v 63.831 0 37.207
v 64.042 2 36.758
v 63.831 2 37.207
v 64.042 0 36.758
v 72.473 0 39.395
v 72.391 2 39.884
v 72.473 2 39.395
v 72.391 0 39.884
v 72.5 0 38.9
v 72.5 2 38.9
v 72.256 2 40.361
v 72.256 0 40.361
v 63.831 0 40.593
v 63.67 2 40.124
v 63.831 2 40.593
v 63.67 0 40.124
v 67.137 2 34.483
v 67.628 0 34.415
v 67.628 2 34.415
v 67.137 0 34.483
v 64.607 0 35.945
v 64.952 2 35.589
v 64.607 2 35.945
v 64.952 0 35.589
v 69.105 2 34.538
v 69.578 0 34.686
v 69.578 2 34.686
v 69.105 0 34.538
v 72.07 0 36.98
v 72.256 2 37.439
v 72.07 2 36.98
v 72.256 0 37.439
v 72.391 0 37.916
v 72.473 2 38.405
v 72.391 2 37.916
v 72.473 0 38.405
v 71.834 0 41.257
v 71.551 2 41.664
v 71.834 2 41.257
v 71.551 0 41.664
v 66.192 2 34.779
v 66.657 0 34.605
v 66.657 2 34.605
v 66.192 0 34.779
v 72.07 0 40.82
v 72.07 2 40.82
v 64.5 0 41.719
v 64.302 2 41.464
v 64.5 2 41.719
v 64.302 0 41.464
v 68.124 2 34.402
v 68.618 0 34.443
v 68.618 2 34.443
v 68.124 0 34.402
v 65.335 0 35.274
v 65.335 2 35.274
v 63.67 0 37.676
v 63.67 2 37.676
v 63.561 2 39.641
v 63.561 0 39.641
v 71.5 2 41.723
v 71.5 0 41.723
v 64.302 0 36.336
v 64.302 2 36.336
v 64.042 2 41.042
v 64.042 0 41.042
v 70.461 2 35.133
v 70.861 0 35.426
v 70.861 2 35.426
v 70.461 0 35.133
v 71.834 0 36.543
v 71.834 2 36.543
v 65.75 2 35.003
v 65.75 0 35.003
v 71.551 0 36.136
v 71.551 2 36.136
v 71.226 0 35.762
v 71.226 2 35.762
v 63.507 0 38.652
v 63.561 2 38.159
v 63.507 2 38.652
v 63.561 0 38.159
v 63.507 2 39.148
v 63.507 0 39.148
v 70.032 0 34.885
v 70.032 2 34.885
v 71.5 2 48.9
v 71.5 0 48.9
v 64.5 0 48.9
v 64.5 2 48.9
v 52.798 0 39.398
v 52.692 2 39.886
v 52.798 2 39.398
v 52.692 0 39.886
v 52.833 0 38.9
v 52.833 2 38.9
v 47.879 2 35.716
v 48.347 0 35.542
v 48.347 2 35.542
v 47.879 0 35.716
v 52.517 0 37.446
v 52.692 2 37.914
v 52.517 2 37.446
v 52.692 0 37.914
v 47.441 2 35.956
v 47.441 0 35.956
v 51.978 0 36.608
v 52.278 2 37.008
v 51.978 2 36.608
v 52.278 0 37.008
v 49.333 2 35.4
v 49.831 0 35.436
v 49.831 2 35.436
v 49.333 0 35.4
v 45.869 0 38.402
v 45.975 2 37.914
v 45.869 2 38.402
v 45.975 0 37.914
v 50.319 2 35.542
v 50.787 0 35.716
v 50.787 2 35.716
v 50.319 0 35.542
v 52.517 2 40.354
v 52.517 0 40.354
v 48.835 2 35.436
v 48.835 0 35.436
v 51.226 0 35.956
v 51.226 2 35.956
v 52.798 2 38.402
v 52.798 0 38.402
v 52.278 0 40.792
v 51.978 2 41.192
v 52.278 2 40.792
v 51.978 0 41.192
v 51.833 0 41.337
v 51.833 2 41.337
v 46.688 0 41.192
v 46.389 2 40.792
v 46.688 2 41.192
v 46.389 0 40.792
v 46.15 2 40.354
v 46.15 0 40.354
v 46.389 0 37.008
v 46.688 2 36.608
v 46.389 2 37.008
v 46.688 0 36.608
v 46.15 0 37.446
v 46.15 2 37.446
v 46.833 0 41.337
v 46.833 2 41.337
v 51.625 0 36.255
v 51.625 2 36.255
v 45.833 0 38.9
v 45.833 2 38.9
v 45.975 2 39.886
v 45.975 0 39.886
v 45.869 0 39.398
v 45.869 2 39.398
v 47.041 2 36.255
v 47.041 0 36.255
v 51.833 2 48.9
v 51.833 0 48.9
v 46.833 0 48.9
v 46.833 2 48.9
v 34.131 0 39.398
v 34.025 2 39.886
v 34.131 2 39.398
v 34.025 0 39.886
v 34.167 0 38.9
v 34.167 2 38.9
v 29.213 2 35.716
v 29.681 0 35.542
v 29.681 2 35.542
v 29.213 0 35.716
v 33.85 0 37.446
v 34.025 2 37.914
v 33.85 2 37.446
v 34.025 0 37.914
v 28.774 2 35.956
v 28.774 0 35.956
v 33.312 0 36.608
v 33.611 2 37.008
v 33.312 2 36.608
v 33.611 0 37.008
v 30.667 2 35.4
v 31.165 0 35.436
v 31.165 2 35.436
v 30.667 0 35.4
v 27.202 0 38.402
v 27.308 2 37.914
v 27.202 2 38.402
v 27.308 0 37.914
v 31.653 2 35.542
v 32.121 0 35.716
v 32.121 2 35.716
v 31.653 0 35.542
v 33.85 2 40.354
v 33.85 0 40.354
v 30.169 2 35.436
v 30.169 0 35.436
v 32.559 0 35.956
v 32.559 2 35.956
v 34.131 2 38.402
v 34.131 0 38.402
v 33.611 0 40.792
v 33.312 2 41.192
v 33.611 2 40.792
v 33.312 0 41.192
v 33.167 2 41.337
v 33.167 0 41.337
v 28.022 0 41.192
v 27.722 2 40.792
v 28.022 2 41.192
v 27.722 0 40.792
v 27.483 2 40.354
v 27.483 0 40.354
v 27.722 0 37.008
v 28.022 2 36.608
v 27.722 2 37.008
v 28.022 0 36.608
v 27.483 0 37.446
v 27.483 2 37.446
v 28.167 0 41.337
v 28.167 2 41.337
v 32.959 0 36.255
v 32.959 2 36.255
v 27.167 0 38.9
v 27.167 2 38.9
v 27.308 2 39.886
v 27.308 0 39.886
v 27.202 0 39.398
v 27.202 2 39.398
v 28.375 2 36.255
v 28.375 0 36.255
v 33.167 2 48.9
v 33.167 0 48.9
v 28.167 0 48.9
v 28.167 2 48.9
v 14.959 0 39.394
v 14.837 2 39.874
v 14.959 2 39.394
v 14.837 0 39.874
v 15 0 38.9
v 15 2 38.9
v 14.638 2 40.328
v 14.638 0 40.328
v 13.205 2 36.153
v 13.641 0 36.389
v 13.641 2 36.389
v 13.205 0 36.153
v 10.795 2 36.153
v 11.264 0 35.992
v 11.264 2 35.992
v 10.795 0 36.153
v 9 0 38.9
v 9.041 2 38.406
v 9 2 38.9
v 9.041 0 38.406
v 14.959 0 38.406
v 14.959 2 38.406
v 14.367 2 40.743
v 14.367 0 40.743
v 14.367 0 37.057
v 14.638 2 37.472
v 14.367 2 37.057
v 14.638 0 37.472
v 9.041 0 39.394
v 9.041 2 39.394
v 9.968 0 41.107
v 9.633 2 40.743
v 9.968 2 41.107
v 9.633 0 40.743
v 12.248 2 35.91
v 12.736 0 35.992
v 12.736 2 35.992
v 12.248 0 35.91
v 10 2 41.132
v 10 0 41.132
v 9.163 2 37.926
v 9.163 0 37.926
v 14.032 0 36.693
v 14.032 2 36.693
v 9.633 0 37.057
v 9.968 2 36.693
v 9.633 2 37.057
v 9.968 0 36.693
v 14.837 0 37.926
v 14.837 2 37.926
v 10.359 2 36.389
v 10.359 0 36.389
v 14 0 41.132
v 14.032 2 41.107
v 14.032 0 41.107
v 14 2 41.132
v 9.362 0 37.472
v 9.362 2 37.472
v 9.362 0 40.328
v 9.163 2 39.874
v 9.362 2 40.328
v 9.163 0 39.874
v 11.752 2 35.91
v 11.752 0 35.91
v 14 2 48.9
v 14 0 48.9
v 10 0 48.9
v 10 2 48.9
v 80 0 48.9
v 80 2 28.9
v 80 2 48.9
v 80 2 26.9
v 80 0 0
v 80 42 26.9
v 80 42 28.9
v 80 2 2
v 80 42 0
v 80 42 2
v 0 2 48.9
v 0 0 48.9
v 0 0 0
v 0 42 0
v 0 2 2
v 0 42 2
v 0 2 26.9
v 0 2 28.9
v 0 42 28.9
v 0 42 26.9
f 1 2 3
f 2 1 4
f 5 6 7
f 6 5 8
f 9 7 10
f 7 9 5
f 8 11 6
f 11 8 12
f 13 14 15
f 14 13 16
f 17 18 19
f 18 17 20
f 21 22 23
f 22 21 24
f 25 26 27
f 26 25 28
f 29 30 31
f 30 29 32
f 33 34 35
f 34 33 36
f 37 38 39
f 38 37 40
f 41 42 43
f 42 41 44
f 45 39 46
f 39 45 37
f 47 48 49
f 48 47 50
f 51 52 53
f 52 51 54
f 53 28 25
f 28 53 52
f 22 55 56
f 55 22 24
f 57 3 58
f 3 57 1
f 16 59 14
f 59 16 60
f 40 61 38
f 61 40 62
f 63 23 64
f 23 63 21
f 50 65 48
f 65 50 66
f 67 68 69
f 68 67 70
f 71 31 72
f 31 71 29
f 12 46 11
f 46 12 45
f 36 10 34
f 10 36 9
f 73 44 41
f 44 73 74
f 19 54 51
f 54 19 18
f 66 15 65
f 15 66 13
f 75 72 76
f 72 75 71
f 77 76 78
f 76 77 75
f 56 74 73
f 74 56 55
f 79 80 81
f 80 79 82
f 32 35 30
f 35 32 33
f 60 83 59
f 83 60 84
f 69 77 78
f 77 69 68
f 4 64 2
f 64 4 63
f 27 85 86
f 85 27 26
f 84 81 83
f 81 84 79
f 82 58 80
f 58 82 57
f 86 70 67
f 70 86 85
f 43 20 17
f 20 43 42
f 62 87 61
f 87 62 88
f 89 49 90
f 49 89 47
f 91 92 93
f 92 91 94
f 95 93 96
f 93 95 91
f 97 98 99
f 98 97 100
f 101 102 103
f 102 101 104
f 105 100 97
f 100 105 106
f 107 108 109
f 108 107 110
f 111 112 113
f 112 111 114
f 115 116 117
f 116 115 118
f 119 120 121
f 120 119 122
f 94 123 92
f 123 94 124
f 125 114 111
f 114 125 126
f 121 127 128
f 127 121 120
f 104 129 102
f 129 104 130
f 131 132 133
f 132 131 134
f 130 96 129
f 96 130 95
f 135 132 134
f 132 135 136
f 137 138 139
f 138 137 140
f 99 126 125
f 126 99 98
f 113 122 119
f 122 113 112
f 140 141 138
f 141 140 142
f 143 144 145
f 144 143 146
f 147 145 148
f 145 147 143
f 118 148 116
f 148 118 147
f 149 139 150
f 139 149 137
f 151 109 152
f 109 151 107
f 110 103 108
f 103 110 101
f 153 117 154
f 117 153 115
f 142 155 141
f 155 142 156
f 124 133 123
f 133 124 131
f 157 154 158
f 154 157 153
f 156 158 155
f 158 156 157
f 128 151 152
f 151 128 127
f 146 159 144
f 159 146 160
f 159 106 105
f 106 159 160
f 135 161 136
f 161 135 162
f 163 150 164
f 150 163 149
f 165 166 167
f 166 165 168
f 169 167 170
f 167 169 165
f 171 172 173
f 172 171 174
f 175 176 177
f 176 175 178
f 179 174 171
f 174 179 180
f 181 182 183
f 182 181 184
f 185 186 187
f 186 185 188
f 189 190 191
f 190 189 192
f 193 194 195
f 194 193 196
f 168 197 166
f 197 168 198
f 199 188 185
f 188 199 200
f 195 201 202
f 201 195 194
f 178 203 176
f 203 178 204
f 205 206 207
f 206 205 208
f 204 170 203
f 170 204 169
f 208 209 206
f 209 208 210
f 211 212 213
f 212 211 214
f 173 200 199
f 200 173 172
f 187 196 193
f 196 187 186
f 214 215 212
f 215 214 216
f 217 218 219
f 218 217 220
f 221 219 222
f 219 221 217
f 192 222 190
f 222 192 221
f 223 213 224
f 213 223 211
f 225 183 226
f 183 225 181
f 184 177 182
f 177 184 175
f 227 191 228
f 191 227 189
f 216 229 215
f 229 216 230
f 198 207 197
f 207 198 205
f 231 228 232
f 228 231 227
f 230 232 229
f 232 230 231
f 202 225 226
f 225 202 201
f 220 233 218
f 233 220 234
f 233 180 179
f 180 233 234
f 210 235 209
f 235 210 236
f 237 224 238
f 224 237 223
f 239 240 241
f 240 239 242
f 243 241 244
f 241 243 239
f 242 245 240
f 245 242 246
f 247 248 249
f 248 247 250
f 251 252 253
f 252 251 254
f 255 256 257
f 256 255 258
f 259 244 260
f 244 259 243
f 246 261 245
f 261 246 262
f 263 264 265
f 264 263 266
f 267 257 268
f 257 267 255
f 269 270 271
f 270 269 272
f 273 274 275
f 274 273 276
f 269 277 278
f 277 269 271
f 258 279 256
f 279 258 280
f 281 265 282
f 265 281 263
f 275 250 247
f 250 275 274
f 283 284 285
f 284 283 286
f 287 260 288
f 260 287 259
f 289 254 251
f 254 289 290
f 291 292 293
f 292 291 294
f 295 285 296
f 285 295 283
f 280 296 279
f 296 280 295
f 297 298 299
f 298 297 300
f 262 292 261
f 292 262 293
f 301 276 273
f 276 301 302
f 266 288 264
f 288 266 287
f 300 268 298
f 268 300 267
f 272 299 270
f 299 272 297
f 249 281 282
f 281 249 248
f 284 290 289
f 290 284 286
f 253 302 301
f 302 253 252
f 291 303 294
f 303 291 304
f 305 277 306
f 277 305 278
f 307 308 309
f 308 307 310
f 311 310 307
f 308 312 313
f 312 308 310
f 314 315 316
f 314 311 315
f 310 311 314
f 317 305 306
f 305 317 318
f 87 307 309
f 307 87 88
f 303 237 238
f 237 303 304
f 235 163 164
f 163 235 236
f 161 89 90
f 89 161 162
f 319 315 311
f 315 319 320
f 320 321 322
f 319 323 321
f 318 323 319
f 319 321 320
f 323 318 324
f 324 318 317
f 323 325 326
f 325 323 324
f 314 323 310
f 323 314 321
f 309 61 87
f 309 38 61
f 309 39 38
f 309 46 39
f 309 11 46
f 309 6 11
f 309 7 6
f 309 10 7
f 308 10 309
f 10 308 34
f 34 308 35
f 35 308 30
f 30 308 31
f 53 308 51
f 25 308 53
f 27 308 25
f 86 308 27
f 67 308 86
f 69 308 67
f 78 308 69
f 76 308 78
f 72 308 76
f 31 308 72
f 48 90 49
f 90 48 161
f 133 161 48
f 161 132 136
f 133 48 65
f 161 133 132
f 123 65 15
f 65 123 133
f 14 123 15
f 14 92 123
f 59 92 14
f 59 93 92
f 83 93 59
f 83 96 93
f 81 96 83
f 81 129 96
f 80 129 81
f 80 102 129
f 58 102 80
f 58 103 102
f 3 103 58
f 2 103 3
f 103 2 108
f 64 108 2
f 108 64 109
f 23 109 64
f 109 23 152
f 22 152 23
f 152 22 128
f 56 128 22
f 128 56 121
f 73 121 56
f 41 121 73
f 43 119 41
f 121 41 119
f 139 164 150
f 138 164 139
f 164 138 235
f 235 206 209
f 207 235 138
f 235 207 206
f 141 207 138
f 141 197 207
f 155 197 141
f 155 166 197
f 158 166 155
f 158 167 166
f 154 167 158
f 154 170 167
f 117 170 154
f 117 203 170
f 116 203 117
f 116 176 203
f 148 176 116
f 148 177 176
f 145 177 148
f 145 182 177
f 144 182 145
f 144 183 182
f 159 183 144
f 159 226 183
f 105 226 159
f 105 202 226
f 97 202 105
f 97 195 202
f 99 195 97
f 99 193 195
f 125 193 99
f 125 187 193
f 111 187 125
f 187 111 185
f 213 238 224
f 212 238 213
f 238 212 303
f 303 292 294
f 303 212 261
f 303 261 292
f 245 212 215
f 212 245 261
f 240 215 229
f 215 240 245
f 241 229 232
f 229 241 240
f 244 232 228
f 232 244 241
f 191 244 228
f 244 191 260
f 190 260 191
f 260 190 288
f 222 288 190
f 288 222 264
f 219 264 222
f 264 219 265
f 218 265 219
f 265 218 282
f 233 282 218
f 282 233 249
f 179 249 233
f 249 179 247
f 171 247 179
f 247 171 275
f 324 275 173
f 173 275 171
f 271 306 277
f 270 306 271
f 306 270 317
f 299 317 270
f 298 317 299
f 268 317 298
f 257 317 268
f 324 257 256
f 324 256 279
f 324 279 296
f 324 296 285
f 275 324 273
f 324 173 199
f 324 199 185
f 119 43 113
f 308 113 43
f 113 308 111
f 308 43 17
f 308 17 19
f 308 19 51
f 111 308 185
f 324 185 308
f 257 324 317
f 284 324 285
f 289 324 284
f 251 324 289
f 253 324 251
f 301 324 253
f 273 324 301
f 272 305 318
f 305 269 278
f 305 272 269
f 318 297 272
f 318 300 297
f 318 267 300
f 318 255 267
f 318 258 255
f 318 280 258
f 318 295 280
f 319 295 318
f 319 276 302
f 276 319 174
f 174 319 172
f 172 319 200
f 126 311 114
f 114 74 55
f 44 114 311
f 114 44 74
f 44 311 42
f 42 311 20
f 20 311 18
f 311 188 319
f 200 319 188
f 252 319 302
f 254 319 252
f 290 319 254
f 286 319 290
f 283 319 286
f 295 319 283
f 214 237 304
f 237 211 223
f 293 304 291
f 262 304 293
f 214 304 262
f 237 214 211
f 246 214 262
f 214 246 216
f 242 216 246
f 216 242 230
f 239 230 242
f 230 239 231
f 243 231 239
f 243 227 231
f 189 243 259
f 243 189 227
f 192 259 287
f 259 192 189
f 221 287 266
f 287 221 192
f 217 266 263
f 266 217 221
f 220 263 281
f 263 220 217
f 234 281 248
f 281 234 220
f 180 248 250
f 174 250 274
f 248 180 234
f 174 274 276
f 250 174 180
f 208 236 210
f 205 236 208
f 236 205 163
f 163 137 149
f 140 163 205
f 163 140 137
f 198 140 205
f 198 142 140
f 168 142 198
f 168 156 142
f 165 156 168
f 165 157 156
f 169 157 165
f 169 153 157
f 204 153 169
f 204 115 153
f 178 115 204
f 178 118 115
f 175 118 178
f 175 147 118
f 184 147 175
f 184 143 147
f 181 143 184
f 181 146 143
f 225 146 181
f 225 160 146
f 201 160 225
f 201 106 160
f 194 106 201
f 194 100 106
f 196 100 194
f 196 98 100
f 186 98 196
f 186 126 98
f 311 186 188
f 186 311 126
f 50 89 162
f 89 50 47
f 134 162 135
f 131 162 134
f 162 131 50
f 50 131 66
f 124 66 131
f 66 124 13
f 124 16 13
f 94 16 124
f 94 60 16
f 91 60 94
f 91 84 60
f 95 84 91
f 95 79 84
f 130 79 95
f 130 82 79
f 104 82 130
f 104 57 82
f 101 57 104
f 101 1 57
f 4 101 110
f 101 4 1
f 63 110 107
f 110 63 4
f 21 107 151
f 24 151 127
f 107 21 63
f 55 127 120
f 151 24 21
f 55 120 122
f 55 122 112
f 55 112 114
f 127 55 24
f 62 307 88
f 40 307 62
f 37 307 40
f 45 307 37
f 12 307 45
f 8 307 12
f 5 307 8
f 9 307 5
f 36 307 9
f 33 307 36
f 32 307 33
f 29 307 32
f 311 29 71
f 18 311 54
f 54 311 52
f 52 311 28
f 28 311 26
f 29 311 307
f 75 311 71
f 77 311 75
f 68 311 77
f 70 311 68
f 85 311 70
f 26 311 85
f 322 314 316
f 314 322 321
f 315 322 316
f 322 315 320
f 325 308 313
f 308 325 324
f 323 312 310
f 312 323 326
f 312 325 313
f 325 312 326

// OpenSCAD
width = 80;
sideMargin = 12;
thickness = 2;
deskPlateThickness = 24.9;
grabDepth = 40;
holderHeight = 20;

cableDiameters = [7, 5, 5, 4];

$fa = 0.5;
$fs = 0.5;

module cableHole(cableDiameter) {
    radius = (cableDiameter + 2) / 2;
    holeDepth = holderHeight / 2;
    translate([0, thickness * 1.5, 2*thickness + deskPlateThickness + holderHeight - holeDepth])
    rotate([90, 0, 0]) {
        cylinder(thickness * 2, radius, radius);
    
        translate([-cableDiameter / 2, 0, 0])
        cube([cableDiameter, holeDepth + 1, thickness * 2]);
    }
}

difference() {
    cube([width, thickness, 2*thickness + deskPlateThickness + holderHeight]);
    
    spacing = (width - 2 * sideMargin) / (len(cableDiameters) - 1);
    start = width - sideMargin;
    
    for(index = [0 : len(cableDiameters) - 1]) {
        translate([start - spacing * index, 0, 0]) cableHole(cableDiameters[index]);
    }
}

translate([0, thickness, 0])
cube([width, grabDepth, thickness]);

translate([0, thickness, thickness + deskPlateThickness])
cube([width, grabDepth, thickness]);
